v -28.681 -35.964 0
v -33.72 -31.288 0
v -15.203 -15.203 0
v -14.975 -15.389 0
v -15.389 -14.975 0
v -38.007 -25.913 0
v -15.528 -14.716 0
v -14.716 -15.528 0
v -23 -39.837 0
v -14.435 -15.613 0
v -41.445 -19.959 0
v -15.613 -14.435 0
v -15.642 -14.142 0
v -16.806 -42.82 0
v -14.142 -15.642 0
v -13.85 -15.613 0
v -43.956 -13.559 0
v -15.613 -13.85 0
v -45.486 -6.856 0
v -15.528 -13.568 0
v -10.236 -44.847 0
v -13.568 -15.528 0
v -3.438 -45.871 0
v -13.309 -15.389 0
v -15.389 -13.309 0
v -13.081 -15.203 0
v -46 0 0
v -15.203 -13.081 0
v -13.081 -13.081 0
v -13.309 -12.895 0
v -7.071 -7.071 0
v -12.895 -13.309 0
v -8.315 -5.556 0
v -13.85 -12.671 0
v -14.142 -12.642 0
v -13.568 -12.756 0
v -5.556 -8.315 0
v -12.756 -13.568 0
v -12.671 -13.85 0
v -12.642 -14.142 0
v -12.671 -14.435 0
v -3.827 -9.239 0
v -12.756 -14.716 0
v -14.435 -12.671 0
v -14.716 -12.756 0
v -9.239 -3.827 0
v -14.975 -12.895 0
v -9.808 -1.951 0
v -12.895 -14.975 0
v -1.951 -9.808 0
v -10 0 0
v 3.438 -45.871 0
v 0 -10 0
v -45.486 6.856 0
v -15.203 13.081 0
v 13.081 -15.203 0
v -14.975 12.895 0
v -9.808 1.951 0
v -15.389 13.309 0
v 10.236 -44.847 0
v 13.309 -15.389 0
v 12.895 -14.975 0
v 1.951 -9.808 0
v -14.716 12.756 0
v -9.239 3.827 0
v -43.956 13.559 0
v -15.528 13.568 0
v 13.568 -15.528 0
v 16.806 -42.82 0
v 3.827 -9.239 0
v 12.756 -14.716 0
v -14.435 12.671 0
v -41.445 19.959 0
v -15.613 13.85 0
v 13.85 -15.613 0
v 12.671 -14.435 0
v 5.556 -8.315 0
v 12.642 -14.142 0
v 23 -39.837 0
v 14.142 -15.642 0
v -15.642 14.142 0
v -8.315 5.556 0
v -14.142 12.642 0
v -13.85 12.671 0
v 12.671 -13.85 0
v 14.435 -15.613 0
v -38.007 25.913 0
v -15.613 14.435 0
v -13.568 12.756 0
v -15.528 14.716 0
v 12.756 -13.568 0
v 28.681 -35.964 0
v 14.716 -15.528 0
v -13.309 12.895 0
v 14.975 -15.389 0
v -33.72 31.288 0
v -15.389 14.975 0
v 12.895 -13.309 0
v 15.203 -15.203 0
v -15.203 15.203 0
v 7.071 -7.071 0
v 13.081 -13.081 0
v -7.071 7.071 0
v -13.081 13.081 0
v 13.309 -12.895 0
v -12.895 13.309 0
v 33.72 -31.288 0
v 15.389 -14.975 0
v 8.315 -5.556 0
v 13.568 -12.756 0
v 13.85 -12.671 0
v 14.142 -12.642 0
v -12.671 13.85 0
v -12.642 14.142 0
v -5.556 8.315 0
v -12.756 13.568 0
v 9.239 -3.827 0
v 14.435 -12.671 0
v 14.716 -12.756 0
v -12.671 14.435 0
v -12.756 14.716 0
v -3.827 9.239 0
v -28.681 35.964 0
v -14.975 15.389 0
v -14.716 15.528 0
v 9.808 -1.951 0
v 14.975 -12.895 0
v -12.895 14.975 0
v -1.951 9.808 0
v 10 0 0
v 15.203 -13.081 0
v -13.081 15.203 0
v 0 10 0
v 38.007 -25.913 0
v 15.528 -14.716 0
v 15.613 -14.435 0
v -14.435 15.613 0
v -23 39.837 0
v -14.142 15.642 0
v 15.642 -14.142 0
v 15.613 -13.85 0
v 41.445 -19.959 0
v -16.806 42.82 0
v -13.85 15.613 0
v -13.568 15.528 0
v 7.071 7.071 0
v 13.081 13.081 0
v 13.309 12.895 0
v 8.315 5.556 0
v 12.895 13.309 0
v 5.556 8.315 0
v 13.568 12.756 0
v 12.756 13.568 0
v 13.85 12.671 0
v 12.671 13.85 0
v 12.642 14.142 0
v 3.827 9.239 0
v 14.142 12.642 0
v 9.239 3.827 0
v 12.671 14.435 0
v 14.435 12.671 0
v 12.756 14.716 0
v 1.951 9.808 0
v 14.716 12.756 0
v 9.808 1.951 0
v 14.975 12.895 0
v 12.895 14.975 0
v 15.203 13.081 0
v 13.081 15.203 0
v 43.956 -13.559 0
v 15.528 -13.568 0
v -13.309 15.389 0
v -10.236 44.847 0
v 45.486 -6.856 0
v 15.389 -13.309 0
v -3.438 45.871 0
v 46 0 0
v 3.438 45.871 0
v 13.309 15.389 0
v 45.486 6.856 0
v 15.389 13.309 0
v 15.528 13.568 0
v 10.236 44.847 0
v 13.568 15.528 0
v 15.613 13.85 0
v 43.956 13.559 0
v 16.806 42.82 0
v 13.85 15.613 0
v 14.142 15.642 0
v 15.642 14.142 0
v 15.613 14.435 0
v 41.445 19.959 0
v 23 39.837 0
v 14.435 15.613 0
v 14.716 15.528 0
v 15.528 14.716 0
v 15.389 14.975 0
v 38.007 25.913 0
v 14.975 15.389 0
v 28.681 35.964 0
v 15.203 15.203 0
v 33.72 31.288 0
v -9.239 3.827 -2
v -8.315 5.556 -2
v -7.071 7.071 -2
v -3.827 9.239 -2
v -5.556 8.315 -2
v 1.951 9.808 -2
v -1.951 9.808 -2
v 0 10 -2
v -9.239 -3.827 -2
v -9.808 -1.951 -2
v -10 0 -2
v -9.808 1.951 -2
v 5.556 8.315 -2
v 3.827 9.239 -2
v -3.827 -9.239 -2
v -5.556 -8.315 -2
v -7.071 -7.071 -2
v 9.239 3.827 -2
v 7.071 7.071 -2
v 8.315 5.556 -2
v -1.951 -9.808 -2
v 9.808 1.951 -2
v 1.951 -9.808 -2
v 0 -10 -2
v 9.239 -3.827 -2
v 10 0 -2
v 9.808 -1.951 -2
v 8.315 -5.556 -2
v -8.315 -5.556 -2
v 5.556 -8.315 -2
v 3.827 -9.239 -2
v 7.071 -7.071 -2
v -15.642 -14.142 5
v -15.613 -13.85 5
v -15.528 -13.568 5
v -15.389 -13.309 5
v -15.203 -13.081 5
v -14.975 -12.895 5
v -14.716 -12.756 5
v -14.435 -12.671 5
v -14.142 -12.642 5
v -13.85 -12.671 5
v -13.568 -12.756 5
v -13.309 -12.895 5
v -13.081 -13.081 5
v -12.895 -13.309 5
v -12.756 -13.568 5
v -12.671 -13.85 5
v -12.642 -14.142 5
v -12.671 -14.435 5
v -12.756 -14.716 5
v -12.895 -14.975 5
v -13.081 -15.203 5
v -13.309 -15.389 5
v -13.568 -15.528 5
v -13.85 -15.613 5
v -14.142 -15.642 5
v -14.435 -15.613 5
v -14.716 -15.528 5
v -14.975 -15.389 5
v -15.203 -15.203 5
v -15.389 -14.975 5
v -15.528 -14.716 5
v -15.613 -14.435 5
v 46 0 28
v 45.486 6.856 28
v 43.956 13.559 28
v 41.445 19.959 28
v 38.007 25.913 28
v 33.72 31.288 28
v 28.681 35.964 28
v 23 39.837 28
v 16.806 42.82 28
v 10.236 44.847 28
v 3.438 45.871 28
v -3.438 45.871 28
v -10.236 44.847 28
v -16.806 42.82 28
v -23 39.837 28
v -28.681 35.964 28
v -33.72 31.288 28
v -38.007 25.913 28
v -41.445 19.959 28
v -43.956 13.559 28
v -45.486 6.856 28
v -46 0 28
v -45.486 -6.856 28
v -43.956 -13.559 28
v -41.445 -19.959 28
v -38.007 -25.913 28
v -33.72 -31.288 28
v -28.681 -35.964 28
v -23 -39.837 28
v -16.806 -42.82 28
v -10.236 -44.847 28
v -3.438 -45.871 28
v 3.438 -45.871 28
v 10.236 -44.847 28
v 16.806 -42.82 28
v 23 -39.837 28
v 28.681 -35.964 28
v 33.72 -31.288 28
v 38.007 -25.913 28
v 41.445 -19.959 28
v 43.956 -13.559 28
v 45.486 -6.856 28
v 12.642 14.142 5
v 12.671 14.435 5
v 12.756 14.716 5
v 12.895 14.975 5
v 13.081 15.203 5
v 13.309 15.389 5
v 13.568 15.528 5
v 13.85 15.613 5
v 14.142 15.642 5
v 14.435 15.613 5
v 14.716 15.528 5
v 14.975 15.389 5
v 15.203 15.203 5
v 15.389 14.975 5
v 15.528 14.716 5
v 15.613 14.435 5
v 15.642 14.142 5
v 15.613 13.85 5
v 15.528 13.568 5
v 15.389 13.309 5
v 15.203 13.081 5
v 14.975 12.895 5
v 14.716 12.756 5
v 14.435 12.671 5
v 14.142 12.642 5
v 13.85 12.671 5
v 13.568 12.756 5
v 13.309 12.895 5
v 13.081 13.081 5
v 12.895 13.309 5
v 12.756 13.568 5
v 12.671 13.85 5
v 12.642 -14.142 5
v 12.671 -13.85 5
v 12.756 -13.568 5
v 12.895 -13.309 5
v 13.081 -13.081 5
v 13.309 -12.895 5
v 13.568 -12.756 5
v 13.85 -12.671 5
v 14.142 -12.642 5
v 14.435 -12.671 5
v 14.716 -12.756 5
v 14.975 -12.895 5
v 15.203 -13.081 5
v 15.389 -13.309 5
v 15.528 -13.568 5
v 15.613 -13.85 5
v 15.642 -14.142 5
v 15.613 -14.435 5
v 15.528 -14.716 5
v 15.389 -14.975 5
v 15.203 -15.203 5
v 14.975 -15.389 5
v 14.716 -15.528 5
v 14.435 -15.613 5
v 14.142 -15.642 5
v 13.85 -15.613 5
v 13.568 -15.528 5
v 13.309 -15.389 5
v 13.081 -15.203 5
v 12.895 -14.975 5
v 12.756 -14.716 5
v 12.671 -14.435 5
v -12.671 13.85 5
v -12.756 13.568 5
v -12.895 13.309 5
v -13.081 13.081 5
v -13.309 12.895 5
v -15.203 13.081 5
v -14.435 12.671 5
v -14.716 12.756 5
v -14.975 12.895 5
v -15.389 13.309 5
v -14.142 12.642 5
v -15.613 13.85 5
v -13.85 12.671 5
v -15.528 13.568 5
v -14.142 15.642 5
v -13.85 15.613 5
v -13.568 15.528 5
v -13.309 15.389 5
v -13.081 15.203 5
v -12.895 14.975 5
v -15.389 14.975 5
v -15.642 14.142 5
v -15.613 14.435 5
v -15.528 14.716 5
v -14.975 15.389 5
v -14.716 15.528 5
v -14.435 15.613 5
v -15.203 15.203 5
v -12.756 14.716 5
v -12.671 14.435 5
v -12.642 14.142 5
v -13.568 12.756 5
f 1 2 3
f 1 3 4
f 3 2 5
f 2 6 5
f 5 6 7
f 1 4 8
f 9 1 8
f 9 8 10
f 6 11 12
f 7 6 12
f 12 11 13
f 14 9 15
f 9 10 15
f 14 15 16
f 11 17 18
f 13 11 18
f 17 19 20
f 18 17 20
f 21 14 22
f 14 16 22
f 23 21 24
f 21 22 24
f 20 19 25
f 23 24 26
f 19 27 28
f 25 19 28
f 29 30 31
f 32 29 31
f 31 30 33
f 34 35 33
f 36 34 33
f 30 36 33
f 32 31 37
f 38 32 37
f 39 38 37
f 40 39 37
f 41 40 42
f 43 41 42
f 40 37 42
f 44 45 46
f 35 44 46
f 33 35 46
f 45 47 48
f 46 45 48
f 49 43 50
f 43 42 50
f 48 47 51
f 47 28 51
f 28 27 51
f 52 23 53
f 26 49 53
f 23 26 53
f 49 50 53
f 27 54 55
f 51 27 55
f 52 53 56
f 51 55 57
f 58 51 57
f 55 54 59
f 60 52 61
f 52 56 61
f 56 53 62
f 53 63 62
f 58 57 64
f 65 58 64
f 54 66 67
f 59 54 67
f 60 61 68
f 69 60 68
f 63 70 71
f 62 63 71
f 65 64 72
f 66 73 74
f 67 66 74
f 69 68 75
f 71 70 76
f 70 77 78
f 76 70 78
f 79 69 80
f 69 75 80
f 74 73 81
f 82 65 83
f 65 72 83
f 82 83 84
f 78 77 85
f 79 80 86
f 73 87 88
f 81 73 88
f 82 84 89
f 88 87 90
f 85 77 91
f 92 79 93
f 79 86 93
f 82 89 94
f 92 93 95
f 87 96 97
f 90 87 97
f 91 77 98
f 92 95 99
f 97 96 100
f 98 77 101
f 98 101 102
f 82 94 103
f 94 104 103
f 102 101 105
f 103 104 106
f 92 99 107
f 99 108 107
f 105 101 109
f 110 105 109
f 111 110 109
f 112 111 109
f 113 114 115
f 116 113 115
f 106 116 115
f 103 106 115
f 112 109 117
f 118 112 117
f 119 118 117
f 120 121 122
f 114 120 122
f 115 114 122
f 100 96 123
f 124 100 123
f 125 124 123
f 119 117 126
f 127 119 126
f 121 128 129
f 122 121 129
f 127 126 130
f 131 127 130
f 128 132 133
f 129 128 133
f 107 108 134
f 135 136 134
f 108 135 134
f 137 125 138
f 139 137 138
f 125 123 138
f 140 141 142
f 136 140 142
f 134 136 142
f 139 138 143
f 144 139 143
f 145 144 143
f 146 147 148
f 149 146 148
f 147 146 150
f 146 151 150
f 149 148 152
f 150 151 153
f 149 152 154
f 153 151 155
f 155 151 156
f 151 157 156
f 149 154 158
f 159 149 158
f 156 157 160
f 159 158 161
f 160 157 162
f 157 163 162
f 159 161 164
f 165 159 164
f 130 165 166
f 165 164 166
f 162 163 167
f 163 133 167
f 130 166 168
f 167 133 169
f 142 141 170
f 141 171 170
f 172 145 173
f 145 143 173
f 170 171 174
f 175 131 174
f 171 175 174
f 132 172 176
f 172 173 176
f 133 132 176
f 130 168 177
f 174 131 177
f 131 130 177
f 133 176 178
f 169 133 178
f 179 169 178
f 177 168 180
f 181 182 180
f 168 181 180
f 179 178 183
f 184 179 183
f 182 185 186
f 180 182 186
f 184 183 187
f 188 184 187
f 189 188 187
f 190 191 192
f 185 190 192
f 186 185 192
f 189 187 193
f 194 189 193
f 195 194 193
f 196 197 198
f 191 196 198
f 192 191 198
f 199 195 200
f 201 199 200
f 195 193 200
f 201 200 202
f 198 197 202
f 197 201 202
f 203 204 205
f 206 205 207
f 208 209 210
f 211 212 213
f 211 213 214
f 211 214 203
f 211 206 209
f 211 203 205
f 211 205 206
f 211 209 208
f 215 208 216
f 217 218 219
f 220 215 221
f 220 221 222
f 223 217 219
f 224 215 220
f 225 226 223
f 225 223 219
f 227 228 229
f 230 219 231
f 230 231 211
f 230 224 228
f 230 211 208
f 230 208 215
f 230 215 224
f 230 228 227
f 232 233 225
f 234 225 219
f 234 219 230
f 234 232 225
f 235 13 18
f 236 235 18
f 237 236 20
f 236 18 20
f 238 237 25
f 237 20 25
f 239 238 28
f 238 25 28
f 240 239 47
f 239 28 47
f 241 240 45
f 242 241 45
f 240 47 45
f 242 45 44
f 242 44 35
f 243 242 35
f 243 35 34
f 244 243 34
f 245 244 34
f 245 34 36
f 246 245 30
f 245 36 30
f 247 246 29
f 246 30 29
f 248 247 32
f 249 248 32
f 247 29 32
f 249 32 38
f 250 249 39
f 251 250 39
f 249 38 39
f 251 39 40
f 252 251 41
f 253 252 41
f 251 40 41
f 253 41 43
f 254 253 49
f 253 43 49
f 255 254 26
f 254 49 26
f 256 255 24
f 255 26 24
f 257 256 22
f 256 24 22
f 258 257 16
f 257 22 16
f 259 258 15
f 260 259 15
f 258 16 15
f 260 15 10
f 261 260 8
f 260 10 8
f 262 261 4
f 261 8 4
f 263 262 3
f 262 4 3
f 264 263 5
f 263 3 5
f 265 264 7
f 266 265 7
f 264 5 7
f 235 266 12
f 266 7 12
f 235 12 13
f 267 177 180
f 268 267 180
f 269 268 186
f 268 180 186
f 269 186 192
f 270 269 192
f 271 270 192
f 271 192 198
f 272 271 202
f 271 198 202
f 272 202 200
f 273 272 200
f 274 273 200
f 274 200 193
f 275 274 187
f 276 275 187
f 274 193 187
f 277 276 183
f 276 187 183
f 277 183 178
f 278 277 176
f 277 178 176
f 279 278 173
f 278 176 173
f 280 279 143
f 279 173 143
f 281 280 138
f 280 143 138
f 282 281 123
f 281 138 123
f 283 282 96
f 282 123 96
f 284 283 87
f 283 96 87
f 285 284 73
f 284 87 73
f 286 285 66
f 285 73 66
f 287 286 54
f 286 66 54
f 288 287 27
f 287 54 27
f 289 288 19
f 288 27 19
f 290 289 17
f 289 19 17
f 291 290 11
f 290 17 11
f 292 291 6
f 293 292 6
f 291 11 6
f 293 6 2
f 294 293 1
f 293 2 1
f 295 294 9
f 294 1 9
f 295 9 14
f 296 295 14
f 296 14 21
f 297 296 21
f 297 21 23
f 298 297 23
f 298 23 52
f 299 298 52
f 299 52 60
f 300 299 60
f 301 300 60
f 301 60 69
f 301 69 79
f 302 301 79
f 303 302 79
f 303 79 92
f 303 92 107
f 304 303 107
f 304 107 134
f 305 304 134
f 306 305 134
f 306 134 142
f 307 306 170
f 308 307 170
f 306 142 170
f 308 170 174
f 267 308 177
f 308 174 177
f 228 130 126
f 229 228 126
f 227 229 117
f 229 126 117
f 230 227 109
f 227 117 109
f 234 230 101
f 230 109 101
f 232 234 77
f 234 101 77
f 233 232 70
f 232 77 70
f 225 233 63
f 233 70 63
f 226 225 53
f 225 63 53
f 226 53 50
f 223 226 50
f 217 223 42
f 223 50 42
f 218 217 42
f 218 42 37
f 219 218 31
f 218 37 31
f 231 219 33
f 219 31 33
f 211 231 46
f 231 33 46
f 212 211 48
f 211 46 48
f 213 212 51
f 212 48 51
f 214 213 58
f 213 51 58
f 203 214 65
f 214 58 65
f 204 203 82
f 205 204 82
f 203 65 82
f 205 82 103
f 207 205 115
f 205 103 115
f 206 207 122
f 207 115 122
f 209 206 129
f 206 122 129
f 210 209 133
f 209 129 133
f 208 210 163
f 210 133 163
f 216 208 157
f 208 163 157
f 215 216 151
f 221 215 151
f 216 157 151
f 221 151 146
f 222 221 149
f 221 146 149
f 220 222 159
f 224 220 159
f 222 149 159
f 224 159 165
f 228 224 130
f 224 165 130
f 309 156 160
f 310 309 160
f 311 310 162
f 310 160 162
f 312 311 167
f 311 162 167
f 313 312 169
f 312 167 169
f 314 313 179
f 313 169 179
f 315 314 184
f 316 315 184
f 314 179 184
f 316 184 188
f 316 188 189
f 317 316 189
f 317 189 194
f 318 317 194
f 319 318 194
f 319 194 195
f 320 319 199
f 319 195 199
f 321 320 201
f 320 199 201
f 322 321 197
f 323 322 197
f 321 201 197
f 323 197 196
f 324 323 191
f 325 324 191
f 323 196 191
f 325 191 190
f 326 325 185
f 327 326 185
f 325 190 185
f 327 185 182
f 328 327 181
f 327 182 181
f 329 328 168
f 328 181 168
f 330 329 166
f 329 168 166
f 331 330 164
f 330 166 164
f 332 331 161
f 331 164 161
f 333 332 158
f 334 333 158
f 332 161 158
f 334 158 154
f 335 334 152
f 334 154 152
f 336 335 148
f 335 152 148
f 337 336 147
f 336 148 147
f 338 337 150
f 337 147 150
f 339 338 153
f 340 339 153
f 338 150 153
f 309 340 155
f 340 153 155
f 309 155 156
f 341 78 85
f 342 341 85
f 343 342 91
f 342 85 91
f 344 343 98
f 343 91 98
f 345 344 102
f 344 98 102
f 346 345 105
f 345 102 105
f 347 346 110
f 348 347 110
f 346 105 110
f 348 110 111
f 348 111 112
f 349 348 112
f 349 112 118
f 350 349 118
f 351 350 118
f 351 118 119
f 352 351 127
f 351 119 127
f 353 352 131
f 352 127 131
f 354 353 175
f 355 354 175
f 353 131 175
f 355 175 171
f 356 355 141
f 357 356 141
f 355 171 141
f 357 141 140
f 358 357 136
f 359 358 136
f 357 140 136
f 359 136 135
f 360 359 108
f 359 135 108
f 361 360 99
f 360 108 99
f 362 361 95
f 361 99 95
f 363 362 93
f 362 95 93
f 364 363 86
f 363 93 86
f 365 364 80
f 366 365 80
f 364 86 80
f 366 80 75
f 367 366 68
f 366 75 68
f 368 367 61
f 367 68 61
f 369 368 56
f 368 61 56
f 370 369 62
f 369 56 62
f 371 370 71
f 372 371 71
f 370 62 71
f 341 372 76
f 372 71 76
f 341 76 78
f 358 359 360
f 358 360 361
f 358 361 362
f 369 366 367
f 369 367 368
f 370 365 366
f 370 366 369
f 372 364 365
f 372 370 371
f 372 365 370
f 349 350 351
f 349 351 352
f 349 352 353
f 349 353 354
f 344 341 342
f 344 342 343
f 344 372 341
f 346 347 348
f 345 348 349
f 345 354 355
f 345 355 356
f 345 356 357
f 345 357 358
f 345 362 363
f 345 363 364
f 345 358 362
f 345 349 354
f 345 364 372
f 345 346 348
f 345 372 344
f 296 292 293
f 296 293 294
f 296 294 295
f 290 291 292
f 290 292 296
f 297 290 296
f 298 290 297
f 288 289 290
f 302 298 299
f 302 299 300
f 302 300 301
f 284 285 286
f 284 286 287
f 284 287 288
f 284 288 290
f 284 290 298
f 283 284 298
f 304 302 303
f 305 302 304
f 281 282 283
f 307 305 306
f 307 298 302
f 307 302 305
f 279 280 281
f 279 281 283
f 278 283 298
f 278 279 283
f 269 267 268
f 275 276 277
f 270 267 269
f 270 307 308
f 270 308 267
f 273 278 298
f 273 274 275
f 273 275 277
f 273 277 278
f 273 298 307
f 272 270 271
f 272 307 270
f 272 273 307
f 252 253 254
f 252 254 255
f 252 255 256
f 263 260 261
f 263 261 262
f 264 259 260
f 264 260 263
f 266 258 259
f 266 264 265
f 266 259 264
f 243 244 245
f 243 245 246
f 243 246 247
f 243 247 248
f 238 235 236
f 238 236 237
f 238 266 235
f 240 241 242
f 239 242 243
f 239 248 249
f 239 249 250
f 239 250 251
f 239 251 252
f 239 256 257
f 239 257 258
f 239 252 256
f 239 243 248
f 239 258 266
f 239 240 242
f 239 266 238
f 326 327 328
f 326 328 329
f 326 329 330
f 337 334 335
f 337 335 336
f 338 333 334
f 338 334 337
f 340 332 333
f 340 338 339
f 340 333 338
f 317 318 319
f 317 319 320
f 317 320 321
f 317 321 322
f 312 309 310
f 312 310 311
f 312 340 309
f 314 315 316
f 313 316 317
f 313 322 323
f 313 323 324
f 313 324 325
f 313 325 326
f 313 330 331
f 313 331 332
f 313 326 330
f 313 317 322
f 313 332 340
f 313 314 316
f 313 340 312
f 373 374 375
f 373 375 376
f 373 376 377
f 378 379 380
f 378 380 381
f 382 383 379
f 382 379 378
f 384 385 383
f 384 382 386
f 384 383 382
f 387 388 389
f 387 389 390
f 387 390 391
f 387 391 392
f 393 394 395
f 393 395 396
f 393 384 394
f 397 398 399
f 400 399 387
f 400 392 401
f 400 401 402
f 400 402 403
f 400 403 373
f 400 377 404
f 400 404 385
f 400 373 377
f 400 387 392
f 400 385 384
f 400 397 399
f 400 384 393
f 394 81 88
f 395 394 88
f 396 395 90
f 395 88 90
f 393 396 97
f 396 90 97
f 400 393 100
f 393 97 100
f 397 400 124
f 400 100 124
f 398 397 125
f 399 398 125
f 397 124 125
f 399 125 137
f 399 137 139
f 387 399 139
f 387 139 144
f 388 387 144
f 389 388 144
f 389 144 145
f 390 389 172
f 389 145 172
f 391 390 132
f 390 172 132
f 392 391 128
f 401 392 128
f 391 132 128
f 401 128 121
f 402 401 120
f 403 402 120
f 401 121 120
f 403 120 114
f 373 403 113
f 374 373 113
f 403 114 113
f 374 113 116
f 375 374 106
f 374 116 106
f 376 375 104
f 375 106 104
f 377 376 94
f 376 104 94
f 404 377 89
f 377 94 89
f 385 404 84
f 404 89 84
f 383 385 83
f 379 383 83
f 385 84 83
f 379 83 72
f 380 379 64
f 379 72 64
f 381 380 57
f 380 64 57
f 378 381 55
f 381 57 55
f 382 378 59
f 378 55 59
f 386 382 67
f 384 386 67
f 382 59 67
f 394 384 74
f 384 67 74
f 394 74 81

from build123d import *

# Parameters (mm, degrees)
SKETCH1_R           = 46
BOSS_EXTRUDE1_DEPTH = 28
SKETCH4_R           = 1.5
CUT_EXTRUDE1_DEPTH  = 5
SKETCH2_R           = 10
BOSS_EXTRUDE2_DEPTH = 2


with BuildPart() as part:
    # Sketch1 → Boss-Extrude1 (new body)
    with BuildSketch(Plane.XY):
        Circle(SKETCH1_R)
    extrude(amount=BOSS_EXTRUDE1_DEPTH)

    # Sketch4 → Cut-Extrude1 (cut)
    with BuildSketch(Plane(origin=(0, 0, 0), x_dir=(-1, 0, 0), z_dir=(0, 0, -1))):
        with Locations((-14.142135624, 14.142135624)):
            Circle(SKETCH4_R)
        with Locations((14.142135624, 14.142135624)):
            Circle(SKETCH4_R)
        with Locations((-14.142135624, -14.142135624)):
            Circle(SKETCH4_R)
        with Locations((14.142135624, -14.142135624)):
            Circle(SKETCH4_R)
    extrude(amount=-CUT_EXTRUDE1_DEPTH, mode=Mode.SUBTRACT)

    # Sketch2 → Boss-Extrude2 (add)
    with BuildSketch(Plane(origin=(0, 0, 0), x_dir=(-1, 0, 0), z_dir=(0, 0, -1))):
        with Locations(Location((0, 0, 0), (0, 0, 180))):
            Circle(SKETCH2_R)
    extrude(amount=BOSS_EXTRUDE2_DEPTH)


solid = part.part
